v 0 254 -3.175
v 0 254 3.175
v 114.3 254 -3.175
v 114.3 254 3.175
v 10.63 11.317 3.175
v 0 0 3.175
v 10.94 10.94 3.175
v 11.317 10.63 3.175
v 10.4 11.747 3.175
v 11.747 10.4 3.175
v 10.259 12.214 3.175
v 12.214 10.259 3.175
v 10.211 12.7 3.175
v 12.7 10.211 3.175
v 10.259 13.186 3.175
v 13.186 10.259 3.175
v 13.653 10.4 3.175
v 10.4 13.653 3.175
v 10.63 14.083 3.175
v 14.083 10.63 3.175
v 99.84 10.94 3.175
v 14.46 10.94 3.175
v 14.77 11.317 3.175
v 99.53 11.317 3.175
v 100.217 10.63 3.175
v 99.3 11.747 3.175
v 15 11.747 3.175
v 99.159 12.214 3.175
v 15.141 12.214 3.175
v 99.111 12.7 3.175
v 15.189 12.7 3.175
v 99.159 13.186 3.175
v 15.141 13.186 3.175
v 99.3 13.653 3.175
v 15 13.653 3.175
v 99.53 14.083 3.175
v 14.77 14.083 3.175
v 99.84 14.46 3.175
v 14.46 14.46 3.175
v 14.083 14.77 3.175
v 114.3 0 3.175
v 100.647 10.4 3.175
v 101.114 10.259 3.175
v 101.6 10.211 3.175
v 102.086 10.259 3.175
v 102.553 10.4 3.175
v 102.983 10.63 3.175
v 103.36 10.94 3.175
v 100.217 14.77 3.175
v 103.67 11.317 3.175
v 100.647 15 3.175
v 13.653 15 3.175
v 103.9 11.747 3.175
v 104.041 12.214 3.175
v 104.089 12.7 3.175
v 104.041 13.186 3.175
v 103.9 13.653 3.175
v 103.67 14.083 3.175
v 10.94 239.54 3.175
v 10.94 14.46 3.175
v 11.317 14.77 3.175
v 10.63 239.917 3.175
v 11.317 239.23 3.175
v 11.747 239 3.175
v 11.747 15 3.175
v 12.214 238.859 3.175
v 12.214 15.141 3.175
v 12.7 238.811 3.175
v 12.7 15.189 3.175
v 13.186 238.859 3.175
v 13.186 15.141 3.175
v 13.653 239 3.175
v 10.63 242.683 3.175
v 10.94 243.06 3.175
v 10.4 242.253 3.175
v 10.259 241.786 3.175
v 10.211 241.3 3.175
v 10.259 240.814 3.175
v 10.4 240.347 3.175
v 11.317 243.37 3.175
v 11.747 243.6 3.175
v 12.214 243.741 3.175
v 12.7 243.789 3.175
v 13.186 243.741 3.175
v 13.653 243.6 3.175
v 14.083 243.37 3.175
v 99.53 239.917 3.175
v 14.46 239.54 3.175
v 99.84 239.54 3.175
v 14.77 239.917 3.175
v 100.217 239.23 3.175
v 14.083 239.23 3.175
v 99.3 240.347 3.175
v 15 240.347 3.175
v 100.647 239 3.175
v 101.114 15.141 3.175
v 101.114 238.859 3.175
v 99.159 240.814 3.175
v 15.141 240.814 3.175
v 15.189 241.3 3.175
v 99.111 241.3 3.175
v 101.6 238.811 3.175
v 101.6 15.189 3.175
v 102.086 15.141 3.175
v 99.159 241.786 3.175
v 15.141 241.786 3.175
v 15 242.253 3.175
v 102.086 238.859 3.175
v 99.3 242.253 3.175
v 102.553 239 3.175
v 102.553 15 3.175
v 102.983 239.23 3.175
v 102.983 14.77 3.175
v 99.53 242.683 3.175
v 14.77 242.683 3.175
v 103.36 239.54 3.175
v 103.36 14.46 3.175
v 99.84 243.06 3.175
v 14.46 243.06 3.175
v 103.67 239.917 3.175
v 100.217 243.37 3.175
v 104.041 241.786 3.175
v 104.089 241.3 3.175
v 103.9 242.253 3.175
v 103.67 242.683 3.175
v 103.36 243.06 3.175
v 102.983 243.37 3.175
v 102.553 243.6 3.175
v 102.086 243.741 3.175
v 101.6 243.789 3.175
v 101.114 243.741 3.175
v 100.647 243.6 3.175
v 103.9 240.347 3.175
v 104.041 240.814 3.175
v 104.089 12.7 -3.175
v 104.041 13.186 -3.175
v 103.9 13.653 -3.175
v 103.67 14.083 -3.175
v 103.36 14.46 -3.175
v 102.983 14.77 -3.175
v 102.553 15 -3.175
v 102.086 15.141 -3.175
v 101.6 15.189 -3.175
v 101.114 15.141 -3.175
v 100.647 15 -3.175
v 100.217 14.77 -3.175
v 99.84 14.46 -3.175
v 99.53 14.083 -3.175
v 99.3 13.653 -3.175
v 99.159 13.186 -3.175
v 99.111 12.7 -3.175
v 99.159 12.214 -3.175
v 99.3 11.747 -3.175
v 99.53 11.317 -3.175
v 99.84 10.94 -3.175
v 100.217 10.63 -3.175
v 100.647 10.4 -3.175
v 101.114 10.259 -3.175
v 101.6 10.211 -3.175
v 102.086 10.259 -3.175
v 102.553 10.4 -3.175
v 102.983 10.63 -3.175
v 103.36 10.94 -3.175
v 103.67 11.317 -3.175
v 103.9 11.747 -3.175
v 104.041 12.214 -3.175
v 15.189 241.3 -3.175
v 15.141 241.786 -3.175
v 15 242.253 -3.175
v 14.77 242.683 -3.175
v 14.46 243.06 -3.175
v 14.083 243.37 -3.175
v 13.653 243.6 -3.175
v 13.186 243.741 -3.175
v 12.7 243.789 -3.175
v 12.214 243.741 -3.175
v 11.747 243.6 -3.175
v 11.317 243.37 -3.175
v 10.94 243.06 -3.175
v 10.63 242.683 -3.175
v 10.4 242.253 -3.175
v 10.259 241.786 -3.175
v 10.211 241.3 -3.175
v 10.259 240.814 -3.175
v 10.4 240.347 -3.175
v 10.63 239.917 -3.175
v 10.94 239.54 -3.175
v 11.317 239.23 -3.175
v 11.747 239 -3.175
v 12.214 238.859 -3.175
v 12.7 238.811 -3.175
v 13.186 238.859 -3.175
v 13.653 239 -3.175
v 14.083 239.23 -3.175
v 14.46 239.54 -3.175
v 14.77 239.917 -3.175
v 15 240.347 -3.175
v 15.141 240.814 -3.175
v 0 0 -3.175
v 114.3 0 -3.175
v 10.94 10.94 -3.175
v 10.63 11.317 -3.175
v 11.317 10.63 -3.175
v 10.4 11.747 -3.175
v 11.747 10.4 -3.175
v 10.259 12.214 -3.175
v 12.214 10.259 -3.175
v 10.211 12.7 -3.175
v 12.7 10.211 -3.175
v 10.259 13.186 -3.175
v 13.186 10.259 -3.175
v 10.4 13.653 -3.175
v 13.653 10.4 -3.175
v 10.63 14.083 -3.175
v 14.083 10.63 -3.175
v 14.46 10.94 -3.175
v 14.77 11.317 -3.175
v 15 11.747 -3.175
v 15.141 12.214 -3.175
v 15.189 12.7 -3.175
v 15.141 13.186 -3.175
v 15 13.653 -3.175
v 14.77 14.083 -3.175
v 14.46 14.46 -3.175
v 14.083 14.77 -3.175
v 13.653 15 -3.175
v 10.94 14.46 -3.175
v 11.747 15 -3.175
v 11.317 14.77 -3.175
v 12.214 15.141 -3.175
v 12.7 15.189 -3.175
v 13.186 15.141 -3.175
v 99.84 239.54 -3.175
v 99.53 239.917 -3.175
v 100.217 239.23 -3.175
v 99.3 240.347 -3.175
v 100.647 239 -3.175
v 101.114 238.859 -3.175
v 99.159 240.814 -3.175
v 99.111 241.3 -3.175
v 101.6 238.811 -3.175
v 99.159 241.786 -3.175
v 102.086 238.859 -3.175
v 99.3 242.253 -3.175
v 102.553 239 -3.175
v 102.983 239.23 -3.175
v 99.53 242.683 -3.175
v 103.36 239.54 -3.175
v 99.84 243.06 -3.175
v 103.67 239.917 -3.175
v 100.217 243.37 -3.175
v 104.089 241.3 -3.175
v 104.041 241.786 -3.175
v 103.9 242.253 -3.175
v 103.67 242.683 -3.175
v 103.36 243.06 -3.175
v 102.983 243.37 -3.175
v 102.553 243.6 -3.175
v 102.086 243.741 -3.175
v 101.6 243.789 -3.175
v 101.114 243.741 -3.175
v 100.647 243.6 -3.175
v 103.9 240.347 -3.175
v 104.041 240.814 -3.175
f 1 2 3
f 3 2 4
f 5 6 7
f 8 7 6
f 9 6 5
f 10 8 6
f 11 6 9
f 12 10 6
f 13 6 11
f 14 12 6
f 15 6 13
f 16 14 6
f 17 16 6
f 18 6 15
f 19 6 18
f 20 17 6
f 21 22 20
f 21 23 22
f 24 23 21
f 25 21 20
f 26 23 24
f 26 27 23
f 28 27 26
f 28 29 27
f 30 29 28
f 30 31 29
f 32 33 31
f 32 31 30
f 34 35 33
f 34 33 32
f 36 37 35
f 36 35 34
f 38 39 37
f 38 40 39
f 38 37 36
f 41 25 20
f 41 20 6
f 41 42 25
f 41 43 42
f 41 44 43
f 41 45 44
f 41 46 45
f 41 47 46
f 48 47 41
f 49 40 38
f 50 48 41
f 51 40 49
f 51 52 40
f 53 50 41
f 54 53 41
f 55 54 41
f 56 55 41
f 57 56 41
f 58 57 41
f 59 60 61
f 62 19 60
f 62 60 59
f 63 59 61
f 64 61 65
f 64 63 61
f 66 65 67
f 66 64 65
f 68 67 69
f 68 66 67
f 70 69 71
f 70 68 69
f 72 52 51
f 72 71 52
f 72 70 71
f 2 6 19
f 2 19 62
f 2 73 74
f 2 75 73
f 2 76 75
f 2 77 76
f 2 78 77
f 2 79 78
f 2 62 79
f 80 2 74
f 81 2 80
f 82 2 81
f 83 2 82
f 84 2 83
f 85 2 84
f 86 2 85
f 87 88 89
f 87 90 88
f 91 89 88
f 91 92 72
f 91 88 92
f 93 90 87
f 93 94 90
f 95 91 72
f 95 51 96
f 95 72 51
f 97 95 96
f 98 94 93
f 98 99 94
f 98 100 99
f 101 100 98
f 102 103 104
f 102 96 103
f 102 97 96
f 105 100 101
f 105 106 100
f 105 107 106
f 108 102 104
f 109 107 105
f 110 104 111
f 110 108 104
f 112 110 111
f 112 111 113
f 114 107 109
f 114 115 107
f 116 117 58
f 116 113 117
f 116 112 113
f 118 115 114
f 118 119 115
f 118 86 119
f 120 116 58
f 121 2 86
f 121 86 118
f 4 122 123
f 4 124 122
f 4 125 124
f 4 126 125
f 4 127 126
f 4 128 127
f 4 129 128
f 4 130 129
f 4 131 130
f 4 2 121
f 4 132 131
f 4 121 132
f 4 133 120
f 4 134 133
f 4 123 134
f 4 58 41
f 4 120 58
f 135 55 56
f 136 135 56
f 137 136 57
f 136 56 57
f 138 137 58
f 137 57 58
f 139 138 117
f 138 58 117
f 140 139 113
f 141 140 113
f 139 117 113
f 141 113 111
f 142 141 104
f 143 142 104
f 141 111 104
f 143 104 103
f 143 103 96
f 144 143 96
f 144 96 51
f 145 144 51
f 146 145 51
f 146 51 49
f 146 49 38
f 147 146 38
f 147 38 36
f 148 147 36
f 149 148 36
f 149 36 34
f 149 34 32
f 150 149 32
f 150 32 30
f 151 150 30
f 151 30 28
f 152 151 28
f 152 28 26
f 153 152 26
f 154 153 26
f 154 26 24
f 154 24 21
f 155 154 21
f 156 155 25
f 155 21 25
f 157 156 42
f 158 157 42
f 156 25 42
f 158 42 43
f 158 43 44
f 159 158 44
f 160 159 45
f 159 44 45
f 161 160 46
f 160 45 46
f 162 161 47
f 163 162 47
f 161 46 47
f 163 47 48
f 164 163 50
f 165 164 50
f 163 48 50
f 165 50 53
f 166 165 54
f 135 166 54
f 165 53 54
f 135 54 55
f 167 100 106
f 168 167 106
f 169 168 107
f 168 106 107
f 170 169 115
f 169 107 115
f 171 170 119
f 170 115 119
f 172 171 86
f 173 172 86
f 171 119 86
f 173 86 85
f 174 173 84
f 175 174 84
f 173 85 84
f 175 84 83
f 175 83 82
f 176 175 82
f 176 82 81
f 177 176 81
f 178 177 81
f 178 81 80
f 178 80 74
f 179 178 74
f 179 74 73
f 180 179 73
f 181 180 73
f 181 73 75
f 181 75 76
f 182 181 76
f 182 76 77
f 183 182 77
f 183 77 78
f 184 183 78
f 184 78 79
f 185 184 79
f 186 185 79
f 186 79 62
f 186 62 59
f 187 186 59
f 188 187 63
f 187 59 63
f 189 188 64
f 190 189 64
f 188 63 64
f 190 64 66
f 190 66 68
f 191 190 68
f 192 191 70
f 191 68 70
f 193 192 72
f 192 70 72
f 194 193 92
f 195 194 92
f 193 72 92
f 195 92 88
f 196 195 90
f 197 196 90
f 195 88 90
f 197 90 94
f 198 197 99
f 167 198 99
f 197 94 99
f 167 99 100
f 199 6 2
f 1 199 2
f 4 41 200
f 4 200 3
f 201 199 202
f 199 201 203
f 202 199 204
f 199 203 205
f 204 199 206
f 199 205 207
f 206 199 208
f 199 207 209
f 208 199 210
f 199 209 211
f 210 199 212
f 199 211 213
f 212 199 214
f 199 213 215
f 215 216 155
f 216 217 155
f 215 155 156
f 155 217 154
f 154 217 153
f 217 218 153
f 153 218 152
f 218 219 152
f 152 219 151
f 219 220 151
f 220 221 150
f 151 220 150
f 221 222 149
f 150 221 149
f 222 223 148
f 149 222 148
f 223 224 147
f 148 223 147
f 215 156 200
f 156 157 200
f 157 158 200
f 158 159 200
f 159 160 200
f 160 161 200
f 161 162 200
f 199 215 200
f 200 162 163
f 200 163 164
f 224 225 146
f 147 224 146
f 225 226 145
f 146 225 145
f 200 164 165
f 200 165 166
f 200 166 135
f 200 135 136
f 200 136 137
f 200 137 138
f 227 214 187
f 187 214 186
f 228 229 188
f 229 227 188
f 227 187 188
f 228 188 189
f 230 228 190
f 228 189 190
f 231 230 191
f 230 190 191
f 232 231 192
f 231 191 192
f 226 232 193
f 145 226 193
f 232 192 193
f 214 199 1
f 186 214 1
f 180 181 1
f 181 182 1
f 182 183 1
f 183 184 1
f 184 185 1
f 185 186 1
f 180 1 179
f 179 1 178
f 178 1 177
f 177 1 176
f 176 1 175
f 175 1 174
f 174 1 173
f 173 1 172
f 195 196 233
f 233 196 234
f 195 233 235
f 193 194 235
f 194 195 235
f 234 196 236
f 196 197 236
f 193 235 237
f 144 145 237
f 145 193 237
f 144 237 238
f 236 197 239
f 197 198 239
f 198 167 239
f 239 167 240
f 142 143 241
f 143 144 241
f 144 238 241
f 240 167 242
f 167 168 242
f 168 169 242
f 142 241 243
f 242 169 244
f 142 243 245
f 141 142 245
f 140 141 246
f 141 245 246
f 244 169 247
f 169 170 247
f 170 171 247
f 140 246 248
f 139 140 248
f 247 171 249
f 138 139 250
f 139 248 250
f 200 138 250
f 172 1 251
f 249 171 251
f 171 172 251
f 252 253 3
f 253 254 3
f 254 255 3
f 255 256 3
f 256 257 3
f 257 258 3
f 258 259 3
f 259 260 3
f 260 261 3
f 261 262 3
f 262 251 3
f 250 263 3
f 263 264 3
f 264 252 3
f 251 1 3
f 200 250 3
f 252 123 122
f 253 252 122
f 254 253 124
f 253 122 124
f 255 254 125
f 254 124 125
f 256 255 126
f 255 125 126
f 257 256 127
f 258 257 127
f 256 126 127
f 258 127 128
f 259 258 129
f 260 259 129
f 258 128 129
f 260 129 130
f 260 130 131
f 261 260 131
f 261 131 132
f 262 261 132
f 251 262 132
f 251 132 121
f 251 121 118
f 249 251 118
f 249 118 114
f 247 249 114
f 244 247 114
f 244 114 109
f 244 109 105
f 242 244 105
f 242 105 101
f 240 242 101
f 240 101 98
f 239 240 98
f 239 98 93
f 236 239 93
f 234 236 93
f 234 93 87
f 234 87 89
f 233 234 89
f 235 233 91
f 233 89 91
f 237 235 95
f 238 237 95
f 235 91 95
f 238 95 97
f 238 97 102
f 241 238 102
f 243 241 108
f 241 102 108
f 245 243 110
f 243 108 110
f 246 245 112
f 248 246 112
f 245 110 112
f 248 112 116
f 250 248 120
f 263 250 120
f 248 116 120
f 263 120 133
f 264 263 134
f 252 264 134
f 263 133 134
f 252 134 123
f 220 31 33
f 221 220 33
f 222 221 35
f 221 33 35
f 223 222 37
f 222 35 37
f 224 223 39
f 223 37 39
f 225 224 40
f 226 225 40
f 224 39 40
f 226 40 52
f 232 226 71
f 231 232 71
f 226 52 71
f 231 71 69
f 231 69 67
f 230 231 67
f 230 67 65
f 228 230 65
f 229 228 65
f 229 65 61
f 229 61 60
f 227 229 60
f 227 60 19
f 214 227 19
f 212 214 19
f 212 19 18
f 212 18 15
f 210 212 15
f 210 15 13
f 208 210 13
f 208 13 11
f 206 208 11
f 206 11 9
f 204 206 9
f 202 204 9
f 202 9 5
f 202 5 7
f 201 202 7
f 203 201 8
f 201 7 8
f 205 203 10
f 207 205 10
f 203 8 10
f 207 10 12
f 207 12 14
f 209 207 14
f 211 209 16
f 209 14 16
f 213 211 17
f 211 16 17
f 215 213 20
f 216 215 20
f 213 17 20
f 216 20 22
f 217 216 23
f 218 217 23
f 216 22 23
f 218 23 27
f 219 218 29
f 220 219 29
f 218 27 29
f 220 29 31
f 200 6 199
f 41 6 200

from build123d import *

# Parameters (mm, degrees)
SKETCH1_W           = 114.3
SKETCH1_H           = 254
BOSS_EXTRUDE1_DEPTH = 3.175
SKETCH2_R           = 2.4892
CUT_EXTRUDE1_DEPTH  = 279.6051193


with BuildPart() as part:
    # Sketch1 → Boss-Extrude1 (new, symmetric)
    with BuildSketch(Plane.XY):
        with Locations((57.15, 127)):
            Rectangle(SKETCH1_W, SKETCH1_H)
    extrude(amount=BOSS_EXTRUDE1_DEPTH, both=True)

    # Sketch2 → Cut-Extrude1 (cut, through all)
    with BuildSketch(Plane.XY.offset(3.175)):
        with Locations((12.7, 241.3)):
            Circle(SKETCH2_R)
        with Locations((12.7, 12.7)):
            Circle(SKETCH2_R)
        with Locations((101.6, 241.3)):
            Circle(SKETCH2_R)
        with Locations((101.6, 12.7)):
            Circle(SKETCH2_R)
    extrude(amount=-CUT_EXTRUDE1_DEPTH, mode=Mode.SUBTRACT)


solid = part.part
